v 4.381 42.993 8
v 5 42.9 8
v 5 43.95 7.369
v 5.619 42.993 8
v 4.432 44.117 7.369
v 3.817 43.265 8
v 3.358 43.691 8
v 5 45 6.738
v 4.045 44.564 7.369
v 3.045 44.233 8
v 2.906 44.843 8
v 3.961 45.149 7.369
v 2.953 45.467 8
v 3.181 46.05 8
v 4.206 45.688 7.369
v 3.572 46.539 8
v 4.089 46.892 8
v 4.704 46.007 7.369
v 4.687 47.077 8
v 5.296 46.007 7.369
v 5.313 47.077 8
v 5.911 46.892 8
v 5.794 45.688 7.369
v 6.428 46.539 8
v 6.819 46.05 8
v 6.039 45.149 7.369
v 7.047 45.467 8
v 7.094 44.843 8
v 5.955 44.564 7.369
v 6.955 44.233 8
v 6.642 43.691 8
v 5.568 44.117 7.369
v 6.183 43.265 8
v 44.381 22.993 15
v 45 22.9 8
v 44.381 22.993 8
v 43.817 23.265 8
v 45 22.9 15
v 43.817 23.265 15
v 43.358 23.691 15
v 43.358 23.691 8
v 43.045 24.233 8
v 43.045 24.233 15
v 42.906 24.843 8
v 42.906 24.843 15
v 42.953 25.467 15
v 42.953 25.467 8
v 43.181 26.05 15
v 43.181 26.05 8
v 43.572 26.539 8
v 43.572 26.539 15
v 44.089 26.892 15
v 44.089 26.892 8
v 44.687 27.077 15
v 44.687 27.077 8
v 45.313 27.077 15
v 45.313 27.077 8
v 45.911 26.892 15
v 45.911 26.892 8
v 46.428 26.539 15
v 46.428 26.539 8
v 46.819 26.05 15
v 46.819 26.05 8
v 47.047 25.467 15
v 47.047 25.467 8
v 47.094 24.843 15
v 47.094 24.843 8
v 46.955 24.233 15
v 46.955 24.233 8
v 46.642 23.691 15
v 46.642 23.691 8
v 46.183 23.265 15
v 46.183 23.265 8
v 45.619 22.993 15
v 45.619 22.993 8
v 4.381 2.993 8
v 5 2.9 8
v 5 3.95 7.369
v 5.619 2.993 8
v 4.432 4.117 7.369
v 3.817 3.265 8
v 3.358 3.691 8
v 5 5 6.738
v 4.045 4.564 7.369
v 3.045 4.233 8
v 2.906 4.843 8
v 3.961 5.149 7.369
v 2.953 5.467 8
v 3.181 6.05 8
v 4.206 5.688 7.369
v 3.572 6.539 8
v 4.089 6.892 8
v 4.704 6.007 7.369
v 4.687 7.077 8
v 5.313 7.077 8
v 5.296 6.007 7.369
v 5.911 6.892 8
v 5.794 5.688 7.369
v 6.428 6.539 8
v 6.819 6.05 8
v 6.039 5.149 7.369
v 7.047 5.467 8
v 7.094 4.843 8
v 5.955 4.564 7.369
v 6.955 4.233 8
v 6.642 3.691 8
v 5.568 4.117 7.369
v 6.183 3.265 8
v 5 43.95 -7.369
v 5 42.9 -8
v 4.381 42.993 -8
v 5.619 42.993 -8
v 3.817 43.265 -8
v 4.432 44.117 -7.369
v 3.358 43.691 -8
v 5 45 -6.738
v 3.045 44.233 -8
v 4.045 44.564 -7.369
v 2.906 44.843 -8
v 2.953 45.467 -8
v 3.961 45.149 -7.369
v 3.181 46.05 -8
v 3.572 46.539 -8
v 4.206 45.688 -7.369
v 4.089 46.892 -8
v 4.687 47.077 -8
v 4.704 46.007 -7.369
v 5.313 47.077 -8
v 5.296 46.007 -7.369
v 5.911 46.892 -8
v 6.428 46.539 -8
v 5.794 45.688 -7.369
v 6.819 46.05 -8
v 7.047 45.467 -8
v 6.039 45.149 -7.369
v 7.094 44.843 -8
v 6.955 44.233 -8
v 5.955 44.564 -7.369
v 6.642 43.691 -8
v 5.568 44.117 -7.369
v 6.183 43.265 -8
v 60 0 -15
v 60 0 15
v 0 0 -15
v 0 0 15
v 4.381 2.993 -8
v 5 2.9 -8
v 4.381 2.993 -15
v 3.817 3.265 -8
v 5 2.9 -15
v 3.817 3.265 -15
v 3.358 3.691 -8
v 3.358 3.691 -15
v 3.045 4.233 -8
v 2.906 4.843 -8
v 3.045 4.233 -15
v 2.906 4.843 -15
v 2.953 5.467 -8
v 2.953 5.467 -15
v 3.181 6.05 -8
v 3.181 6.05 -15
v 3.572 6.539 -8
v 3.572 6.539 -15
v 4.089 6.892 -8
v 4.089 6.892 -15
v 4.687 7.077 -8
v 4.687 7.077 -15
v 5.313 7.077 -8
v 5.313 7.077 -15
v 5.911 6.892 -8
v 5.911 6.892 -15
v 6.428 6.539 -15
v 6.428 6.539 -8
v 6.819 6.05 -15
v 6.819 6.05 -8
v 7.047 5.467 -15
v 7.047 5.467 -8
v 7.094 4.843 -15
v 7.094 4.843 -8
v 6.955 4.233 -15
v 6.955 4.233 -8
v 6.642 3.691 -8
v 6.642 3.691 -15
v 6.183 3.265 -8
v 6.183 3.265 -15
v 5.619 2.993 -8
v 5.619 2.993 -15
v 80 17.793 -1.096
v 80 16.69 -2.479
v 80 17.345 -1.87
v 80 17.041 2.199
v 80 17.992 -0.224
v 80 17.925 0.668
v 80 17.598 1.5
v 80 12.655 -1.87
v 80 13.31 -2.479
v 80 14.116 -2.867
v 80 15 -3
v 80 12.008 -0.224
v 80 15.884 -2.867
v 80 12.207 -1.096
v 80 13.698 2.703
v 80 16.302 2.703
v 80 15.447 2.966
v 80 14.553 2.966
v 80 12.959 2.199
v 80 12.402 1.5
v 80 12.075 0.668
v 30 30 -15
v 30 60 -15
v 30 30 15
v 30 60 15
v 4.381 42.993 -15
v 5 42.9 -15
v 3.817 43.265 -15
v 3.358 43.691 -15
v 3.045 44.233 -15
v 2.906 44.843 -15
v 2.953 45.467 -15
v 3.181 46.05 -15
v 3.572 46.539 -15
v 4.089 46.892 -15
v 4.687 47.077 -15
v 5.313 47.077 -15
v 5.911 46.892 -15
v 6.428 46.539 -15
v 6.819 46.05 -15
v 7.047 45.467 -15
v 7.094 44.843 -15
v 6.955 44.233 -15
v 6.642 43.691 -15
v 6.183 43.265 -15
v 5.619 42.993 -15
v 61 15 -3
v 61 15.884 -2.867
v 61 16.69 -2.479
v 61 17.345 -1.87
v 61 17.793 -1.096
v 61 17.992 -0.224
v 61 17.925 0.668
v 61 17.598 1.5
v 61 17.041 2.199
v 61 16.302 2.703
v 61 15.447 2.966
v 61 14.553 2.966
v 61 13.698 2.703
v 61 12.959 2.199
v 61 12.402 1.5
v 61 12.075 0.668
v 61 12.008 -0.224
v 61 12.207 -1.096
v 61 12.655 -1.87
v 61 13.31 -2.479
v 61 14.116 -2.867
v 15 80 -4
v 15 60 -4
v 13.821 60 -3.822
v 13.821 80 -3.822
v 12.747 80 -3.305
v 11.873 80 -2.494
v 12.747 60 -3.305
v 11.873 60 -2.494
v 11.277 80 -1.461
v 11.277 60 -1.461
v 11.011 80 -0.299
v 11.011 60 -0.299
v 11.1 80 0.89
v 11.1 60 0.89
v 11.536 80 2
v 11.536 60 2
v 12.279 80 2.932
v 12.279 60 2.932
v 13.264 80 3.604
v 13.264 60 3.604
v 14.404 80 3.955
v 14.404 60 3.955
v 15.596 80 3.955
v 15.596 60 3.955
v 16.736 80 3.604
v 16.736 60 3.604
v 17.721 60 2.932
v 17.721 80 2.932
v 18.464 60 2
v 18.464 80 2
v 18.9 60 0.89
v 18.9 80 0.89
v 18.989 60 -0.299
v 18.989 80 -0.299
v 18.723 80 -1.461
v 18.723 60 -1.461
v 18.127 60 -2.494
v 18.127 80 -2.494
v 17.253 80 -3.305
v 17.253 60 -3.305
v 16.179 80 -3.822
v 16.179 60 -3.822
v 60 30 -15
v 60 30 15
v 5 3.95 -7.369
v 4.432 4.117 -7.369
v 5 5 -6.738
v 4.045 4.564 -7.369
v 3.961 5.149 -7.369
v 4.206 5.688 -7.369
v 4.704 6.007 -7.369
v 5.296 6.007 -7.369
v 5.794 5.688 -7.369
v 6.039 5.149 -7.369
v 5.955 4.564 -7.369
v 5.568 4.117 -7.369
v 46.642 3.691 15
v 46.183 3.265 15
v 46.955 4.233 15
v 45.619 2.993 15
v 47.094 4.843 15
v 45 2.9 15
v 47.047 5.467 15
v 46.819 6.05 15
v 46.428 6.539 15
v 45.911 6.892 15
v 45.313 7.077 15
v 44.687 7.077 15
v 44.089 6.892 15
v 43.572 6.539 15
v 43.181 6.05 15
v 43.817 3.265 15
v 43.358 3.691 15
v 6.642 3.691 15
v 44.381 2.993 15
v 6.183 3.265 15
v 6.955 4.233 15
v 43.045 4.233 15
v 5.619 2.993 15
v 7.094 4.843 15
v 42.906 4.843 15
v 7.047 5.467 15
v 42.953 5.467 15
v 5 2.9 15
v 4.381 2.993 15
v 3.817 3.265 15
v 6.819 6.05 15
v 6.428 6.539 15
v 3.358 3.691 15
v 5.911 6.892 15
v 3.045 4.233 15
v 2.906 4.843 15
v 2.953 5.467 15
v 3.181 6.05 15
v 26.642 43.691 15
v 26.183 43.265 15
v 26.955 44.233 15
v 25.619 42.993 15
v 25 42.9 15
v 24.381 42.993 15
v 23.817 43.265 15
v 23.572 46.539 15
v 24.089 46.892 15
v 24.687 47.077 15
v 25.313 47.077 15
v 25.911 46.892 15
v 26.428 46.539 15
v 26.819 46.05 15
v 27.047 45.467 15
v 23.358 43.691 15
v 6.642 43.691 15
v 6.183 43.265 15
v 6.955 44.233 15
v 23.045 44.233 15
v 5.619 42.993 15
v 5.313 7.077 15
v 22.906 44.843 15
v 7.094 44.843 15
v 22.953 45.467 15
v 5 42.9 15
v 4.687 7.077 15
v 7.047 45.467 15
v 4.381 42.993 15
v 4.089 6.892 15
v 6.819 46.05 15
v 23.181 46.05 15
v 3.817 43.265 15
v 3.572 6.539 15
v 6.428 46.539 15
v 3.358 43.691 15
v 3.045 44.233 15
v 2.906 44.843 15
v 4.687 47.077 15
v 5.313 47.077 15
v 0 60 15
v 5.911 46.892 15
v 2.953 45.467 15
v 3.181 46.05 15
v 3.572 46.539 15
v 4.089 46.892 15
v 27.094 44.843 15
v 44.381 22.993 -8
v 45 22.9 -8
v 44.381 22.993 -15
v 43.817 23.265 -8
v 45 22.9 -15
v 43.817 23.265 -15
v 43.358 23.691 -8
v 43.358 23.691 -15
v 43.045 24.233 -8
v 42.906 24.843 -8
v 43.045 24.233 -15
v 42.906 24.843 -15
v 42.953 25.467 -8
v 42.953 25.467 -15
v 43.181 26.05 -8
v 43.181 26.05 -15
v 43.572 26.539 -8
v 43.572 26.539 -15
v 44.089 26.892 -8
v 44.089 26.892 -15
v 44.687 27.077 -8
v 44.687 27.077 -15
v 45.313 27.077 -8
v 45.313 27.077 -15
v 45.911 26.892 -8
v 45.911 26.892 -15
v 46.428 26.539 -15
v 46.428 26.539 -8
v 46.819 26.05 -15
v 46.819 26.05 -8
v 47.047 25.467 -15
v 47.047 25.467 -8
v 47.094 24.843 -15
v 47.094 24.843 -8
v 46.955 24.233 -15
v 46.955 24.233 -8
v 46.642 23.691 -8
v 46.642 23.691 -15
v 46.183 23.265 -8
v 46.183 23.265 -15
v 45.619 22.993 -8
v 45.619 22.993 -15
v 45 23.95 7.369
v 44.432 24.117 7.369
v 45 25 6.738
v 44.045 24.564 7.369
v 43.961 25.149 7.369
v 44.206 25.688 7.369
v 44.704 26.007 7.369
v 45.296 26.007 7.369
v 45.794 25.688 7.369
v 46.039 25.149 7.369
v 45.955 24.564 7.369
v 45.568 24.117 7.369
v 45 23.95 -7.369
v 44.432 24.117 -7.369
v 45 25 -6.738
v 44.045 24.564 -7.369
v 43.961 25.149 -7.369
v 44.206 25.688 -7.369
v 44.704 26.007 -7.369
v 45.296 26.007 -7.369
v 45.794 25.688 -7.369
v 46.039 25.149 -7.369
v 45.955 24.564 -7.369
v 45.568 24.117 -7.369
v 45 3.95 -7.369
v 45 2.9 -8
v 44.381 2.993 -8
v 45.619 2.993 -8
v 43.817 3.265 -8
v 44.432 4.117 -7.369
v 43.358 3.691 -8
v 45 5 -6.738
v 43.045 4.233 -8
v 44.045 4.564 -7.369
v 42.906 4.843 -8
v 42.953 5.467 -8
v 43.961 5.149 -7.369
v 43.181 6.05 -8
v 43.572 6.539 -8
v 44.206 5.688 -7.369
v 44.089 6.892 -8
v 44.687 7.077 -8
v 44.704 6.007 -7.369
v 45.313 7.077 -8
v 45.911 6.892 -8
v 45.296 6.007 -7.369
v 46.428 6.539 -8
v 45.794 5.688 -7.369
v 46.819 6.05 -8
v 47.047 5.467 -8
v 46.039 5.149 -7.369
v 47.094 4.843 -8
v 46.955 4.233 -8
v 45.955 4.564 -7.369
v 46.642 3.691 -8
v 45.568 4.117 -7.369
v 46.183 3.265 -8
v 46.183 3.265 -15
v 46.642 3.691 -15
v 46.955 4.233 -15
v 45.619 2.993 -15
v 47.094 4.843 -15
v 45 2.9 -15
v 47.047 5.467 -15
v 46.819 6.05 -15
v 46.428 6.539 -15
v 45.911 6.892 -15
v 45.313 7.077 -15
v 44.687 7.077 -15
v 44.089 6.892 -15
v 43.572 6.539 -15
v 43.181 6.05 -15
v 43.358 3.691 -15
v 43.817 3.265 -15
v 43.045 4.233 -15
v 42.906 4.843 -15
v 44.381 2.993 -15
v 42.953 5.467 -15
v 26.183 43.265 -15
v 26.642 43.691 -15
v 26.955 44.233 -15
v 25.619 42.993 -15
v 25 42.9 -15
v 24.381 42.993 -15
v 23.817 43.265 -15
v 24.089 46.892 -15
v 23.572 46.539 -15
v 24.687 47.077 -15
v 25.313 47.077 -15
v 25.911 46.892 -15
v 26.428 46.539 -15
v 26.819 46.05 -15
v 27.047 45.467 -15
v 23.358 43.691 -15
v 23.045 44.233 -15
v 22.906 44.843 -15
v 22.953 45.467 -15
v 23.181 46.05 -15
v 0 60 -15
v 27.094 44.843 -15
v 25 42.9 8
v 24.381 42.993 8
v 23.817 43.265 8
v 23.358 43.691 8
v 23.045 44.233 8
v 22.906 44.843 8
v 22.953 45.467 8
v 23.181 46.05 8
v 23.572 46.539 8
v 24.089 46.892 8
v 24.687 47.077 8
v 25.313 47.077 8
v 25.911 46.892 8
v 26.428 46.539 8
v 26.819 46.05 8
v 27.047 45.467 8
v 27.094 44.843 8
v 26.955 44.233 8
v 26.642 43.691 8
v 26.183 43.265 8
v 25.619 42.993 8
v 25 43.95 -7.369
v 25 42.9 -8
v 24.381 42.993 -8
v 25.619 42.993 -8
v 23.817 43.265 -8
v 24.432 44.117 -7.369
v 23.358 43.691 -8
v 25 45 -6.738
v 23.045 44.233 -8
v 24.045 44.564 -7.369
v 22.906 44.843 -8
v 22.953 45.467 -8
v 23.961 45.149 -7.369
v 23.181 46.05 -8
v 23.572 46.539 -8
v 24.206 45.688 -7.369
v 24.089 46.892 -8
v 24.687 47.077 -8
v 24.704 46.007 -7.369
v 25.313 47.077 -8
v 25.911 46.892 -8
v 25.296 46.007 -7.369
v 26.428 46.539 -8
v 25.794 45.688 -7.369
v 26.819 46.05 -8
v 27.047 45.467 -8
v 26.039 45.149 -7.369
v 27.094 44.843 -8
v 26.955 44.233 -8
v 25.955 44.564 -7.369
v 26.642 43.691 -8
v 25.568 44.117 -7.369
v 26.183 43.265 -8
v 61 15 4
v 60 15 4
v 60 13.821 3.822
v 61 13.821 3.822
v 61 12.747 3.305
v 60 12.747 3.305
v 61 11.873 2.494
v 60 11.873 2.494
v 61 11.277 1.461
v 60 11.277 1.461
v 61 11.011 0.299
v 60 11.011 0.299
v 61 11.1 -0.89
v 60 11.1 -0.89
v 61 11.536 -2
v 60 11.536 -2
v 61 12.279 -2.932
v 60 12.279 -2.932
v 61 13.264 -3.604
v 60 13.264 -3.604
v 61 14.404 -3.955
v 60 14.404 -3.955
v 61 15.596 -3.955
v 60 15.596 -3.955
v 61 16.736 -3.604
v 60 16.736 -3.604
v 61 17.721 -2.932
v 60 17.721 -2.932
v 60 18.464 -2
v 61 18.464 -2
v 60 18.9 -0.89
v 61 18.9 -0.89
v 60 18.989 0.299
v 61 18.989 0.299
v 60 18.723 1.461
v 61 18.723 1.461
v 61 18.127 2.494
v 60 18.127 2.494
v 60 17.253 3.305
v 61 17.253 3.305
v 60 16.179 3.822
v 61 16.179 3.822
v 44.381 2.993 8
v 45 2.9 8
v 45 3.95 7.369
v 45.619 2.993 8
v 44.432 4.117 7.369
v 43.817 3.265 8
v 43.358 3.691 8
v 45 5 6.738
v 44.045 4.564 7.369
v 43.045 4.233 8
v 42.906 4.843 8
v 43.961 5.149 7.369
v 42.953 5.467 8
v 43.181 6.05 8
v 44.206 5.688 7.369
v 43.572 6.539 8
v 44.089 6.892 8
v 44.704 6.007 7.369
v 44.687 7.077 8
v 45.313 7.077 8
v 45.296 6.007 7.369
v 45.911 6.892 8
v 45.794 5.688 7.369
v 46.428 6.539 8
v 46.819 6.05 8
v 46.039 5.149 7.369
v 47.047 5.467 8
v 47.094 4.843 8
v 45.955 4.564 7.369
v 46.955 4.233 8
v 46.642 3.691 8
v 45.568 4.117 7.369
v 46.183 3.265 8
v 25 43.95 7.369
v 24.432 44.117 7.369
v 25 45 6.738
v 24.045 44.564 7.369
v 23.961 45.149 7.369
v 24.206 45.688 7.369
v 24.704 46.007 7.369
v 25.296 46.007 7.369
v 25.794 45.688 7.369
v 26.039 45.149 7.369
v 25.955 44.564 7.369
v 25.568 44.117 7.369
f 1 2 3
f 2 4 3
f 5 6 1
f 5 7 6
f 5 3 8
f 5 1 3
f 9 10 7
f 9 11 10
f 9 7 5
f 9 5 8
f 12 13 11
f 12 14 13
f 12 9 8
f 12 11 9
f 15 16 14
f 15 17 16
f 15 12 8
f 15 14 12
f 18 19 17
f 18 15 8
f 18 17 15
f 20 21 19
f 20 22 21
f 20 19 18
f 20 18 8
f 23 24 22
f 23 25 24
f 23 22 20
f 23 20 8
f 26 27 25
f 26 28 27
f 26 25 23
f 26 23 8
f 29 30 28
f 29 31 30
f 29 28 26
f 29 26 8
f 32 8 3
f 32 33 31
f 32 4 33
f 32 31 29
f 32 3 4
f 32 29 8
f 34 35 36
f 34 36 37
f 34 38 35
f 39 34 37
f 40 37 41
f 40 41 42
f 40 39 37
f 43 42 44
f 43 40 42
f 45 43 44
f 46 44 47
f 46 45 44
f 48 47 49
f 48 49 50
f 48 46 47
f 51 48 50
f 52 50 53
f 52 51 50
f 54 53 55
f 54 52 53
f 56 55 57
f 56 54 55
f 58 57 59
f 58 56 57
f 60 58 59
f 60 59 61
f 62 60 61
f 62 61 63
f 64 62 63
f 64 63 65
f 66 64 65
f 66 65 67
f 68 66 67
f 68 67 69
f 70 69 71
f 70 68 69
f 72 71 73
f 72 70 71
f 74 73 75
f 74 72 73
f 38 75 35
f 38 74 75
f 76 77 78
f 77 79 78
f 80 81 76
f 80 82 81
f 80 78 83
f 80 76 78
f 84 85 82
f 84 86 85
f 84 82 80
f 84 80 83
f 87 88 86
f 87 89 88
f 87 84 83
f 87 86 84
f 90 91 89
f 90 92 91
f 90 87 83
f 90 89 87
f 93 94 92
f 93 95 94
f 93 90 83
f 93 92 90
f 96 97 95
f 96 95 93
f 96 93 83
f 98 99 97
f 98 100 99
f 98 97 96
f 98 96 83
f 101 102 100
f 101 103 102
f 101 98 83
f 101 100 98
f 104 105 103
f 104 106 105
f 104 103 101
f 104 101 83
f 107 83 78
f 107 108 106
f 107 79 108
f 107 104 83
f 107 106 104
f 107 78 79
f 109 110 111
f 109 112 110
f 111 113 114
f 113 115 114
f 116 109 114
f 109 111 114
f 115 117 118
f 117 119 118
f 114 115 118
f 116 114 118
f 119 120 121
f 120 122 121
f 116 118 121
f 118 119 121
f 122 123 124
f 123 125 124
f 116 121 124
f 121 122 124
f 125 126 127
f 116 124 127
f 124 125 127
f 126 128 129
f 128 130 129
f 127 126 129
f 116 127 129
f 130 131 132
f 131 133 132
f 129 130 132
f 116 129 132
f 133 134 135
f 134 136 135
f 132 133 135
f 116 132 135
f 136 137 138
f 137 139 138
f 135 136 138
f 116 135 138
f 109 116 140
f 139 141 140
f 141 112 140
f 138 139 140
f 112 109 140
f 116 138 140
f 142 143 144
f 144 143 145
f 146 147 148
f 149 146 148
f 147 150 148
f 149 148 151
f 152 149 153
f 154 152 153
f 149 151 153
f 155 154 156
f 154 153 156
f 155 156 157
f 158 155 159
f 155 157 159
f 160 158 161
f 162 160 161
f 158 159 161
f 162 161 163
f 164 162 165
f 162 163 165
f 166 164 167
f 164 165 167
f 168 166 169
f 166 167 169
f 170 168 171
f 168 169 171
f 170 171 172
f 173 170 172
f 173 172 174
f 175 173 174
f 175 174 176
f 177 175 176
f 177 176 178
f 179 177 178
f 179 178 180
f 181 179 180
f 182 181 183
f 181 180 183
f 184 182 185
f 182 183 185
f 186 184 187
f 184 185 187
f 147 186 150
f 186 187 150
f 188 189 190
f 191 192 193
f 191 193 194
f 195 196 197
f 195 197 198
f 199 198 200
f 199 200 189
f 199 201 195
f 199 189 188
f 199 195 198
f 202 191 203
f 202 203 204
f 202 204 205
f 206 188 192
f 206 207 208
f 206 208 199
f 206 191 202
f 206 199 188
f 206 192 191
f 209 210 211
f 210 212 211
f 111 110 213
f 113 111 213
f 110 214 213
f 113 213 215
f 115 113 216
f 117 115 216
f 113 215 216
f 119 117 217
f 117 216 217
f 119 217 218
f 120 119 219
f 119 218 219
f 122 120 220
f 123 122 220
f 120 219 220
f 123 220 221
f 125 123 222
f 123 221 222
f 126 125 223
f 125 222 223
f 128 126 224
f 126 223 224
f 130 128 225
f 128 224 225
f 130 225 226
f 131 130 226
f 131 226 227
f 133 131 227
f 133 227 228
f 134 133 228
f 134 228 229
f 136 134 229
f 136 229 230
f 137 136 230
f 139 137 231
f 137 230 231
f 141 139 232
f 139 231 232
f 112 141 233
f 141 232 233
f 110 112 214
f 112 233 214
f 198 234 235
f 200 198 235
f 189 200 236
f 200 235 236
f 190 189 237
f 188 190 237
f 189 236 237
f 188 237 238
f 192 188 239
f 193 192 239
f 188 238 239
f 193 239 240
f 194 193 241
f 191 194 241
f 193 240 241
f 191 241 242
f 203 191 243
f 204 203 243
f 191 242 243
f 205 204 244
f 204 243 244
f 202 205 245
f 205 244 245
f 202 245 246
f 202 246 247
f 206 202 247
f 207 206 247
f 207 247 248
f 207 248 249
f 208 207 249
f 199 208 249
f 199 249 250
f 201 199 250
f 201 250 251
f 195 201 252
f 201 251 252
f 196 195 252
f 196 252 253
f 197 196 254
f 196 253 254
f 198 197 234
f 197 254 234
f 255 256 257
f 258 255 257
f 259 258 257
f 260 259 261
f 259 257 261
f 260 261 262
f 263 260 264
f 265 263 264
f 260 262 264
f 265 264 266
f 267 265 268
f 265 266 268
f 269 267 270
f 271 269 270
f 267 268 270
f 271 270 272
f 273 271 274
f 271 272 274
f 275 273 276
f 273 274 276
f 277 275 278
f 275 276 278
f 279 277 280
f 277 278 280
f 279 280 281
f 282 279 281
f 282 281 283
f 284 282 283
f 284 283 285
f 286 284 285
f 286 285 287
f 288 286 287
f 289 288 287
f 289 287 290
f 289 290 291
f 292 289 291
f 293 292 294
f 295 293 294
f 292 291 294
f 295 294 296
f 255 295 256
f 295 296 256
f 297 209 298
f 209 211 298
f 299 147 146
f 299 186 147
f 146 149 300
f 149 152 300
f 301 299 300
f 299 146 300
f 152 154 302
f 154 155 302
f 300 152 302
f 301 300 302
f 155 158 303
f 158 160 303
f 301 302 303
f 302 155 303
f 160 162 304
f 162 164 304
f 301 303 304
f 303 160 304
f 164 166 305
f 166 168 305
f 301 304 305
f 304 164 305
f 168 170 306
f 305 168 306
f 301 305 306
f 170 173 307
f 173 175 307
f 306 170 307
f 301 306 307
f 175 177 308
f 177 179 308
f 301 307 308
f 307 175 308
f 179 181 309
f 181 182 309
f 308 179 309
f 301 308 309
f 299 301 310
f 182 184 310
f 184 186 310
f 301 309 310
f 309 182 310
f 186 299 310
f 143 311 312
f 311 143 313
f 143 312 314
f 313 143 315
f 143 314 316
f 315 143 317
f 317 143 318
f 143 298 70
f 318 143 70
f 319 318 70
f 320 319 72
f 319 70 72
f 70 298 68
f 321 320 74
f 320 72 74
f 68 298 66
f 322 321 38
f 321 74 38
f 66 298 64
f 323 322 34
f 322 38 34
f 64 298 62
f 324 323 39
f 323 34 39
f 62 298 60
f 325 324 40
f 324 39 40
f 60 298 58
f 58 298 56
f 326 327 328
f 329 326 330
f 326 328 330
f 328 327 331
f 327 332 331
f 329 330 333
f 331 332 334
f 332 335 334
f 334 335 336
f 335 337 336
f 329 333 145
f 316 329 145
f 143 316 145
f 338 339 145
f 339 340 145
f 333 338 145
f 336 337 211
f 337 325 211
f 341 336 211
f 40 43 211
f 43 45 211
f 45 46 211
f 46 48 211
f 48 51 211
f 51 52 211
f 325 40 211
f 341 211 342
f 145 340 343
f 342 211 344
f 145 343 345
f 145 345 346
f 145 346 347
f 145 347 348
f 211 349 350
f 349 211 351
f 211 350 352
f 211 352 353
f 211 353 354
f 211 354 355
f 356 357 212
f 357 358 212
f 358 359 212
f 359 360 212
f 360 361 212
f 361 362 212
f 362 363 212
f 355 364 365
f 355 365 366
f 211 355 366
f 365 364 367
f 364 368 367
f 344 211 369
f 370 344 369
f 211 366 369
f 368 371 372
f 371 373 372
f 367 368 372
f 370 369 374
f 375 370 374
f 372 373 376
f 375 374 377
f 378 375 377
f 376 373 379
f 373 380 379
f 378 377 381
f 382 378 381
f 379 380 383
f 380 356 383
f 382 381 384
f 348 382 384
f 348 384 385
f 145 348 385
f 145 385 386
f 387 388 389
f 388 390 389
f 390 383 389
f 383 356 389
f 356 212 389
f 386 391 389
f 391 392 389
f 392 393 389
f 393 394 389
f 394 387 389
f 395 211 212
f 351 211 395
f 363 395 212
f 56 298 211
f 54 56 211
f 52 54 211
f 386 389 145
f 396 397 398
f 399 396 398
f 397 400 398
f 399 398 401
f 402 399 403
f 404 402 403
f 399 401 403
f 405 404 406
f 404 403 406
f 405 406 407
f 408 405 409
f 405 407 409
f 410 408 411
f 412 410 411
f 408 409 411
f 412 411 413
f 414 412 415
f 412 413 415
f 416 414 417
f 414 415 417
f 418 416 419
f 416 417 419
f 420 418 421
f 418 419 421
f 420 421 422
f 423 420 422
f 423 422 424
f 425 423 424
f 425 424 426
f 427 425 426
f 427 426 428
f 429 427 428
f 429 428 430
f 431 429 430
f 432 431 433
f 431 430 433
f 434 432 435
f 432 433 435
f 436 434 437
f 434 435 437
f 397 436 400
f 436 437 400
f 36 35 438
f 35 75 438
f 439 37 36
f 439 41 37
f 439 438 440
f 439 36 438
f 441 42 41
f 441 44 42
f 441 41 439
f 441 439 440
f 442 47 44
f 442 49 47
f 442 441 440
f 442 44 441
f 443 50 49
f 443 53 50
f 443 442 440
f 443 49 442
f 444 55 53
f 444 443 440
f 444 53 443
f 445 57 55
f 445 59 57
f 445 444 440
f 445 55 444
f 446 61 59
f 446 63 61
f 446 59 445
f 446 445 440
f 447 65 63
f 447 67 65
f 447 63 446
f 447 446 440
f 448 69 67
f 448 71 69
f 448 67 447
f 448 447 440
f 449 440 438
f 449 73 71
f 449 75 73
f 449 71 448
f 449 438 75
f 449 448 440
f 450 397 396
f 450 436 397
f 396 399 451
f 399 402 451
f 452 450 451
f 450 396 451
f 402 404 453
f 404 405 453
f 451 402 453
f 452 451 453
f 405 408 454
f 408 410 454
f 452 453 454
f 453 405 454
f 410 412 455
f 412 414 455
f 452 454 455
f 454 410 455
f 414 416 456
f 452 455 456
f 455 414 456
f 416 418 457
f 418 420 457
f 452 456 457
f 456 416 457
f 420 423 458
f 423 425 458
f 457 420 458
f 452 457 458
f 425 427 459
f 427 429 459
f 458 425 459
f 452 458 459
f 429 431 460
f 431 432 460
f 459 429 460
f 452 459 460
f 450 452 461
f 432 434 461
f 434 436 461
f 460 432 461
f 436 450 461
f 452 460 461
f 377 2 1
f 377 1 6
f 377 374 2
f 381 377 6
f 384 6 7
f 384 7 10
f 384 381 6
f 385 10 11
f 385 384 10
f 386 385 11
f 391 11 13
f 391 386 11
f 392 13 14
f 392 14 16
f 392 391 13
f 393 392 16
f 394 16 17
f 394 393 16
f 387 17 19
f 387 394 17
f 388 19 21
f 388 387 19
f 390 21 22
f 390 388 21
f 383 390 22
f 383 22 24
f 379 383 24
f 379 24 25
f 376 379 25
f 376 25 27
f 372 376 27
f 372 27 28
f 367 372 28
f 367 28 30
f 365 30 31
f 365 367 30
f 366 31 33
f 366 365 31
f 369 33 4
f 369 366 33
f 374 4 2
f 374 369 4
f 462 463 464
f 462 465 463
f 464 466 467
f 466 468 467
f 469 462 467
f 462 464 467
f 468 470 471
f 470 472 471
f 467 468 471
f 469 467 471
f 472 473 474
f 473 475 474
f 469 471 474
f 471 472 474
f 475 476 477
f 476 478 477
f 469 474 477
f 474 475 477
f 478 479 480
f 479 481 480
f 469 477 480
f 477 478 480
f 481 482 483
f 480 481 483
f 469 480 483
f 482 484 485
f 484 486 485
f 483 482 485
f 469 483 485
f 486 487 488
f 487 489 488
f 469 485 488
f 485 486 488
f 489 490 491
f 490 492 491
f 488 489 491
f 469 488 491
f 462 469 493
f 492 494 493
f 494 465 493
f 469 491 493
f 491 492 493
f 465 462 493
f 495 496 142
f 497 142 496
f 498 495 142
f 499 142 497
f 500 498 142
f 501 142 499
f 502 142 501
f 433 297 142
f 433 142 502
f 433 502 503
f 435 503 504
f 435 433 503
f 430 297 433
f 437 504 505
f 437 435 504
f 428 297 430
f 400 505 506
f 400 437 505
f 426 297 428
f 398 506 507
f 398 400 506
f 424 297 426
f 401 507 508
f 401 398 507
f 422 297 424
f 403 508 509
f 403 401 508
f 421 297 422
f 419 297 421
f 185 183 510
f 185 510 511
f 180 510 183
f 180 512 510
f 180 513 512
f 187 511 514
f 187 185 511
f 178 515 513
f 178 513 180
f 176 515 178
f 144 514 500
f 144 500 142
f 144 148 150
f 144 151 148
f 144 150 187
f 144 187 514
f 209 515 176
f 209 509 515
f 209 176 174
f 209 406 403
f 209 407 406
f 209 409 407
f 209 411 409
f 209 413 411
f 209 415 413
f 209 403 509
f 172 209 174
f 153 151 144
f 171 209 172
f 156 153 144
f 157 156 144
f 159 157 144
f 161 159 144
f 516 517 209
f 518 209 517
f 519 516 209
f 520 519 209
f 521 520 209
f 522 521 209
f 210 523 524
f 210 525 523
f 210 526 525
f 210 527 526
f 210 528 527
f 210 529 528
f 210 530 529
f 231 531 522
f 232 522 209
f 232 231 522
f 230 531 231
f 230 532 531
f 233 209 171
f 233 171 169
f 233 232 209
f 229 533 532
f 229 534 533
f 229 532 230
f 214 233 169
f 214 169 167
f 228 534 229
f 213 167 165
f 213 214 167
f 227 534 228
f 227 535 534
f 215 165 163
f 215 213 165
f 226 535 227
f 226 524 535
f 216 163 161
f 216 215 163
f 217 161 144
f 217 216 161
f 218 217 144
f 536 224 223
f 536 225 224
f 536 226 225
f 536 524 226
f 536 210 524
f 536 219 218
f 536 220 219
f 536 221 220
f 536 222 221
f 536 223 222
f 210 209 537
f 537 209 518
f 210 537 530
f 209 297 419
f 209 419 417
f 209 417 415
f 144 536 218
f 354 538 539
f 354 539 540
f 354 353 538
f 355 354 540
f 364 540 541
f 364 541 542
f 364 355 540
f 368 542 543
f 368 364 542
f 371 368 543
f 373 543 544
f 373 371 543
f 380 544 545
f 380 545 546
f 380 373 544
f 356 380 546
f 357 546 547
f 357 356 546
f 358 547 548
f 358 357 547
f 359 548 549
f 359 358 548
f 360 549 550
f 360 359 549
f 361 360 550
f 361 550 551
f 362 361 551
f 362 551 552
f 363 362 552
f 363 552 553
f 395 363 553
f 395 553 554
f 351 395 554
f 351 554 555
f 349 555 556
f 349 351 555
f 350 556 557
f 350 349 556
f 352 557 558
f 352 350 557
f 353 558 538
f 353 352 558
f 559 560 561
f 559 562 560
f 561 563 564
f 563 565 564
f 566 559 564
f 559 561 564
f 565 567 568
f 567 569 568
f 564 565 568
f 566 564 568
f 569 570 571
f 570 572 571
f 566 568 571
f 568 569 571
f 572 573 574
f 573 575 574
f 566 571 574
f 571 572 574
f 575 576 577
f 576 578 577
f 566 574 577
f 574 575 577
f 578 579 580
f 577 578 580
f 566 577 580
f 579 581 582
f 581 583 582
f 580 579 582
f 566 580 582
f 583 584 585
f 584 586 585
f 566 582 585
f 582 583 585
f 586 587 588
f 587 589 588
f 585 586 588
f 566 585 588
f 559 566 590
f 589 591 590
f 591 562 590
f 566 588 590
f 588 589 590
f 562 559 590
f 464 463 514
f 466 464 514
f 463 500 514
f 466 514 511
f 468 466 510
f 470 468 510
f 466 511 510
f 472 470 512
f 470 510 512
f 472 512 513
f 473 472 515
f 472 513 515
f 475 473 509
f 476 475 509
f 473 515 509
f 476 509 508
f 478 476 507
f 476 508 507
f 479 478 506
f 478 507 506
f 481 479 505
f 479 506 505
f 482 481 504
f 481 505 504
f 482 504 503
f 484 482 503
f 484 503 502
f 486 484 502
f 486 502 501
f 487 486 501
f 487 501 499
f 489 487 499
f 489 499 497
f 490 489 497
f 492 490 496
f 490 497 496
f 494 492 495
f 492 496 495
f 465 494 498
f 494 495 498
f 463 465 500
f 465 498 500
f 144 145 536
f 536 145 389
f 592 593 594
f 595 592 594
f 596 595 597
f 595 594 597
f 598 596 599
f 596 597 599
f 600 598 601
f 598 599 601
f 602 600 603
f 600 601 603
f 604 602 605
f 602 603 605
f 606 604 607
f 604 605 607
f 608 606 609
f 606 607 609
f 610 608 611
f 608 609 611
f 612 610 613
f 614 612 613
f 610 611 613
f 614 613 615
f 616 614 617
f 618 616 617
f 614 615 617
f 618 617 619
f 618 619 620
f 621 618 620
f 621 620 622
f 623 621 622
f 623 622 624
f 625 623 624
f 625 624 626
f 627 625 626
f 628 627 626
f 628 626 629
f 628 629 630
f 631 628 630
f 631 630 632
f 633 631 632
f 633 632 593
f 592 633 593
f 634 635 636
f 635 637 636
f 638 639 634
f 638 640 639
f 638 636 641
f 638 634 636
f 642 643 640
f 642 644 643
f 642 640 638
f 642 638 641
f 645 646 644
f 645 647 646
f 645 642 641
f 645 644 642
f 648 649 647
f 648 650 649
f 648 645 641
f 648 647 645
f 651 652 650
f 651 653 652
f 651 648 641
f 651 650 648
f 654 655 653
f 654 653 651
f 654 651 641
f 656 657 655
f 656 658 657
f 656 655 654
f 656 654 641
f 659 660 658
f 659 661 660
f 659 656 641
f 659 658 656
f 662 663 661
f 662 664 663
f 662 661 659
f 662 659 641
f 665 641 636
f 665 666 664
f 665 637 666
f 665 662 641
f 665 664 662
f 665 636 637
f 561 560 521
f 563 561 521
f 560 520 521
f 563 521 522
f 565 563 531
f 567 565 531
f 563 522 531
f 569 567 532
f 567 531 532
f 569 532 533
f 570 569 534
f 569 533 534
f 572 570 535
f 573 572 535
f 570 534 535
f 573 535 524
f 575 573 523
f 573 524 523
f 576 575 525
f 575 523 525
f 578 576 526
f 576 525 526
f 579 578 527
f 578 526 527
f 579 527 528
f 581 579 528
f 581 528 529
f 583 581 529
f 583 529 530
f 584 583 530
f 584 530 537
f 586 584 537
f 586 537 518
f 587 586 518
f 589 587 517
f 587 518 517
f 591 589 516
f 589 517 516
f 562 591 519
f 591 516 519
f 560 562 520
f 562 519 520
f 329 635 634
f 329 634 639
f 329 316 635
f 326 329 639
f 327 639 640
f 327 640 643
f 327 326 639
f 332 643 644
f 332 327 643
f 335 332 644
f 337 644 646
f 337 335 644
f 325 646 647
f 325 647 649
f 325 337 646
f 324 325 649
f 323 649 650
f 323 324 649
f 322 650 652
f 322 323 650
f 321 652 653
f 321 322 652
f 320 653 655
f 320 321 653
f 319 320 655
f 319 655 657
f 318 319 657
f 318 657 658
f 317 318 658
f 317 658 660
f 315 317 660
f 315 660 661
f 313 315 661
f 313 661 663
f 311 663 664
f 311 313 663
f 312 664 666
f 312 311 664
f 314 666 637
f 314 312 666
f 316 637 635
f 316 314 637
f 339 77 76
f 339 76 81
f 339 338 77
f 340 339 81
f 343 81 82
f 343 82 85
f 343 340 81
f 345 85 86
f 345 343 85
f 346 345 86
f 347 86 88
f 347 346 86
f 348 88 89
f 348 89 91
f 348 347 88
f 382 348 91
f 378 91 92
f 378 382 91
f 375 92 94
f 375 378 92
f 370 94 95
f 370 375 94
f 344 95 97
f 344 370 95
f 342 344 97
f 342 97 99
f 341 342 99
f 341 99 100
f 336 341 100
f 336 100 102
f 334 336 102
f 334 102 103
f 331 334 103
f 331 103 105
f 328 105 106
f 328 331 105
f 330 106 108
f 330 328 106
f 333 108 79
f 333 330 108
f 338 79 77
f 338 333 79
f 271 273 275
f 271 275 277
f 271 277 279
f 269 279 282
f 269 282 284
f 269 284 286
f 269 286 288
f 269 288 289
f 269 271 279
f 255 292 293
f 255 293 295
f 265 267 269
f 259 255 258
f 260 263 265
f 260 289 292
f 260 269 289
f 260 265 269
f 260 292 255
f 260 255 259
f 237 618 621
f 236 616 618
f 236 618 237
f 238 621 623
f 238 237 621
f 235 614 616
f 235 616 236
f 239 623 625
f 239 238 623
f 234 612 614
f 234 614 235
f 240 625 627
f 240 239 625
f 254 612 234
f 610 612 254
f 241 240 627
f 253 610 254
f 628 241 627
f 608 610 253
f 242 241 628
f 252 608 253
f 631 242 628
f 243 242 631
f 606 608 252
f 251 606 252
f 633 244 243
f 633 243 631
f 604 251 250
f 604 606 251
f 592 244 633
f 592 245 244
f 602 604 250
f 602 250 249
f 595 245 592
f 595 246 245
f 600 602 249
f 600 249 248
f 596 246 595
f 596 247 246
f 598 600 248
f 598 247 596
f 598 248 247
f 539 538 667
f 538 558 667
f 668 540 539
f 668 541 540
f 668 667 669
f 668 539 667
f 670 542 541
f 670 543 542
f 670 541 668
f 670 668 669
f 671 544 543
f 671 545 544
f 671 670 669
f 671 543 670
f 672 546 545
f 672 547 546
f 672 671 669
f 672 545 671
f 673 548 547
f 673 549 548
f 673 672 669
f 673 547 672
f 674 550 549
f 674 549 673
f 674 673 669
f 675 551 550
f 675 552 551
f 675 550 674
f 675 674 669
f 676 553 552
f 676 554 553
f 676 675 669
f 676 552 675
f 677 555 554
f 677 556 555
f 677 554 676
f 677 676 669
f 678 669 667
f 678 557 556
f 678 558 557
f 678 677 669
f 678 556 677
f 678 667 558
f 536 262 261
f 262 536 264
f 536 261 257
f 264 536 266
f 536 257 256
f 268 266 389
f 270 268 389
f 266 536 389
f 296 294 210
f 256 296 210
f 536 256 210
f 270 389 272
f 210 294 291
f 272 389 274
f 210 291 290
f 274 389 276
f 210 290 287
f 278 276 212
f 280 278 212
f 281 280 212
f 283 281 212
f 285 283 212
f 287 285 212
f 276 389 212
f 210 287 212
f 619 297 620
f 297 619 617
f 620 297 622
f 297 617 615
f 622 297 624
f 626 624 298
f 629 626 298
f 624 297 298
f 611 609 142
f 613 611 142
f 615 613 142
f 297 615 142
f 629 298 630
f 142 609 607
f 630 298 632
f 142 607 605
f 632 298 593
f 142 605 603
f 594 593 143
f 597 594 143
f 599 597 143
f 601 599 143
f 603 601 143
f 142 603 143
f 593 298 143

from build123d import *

# Parameters (mm, degrees)
BOSS_EXTRU_1_DEPTH             = 15
ESQUISSE3_R                    = 4
BOSS_EXTRU_2_DEPTH             = 20
ESQUISSE4_R                    = 4
BOSS_EXTRU_3_DEPTH             = 20
TROU_TARAUD_M5X0_85_AT_2_COUNT = 2
TROU_TARAUD_M5X0_85_AT_2_PITCH = 44.72135955
ENL_V_START                    = -19
ESQUISSE13_R                   = 4
ESQUISSE13_R_2                 = 3
ENL_V_MAT_EXTRU_1_DEPTH        = 19


with BuildPart() as part:
    # Esquisse1 → Boss.-Extru.1 (new, symmetric)
    with BuildSketch(Plane.XY):
        Polygon((0, 60), (30, 60), (30, 30), (60, 30), (60, 0), (0, 0), align=None)
    extrude(amount=BOSS_EXTRU_1_DEPTH, both=True)

    # Esquisse3 → Boss.-Extru.2 (add)
    with BuildSketch(Plane(origin=(0, 60, 0), x_dir=(-1, 0, 0), z_dir=(0, 1, 0))):
        with Locations(Location((-15, 0, 0), (0, 0, 270))):
            Circle(ESQUISSE3_R)
    extrude(amount=BOSS_EXTRU_2_DEPTH)

    # Esquisse4 → Boss.-Extru.3 (add)
    with BuildSketch(Plane(origin=(60, 0, 0), x_dir=(0, 0, -1), z_dir=(1, 0, 0))):
        with Locations(Location((0, 15, 0), (0, 0, 180))):
            Circle(ESQUISSE4_R)
    extrude(amount=BOSS_EXTRU_3_DEPTH)

    # Esquisse8 → Trou taraudé M5x0.82 (revolve, cut)
    with BuildSketch(Plane(origin=(45, 5, 15), x_dir=(0, -1, 0), z_dir=(1, 0, 0))):
        Polygon((0, 0), (0, 8.2618073), (2.1, 7), (2.1, 0), align=None)
    trou_taraud_m5x0_82 = revolve(axis=Axis((45, 5, 21.35), (0, 0, -1)), mode=Mode.SUBTRACT)

    # Esquisse9 → Trou taraudé M5x0.83 (revolve, cut)
    with BuildSketch(Plane(origin=(45, 25, 15), x_dir=(0, -1, 0), z_dir=(1, 0, 0))):
        Polygon((0, 0), (0, 8.2618073), (2.1, 7), (2.1, 0), align=None)
    trou_taraud_m5x0_83 = revolve(axis=Axis((45, 25, 21.35), (0, 0, -1)), mode=Mode.SUBTRACT)

    # Esquisse10 → Trou taraudé M5x0.84 (revolve, cut)
    with BuildSketch(Plane(origin=(5, 45, 15), x_dir=(0, -1, 0), z_dir=(1, 0, 0))):
        Polygon((0, 0), (0, 8.2618073), (2.1, 7), (2.1, 0), align=None)
    trou_taraud_m5x0_84 = revolve(axis=Axis((5, 45, 21.35), (0, 0, -1)), mode=Mode.SUBTRACT)

    # Esquisse12 → Trou taraudé M5x0.85 (revolve, cut)
    with BuildSketch(Plane(origin=(25, 45, 15), x_dir=(0, -1, 0), z_dir=(1, 0, 0))):
        Polygon((0, 0), (0, 8.2618073), (2.1, 7), (2.1, 0), align=None)
    trou_taraud_m5x0_85 = revolve(axis=Axis((25, 45, 21.35), (0, 0, -1)), mode=Mode.SUBTRACT)

    # Trou taraudé M5x0.85 at 2: Trou taraudé M5x0.85 ×2
    with Locations(*[Vector(-0.447213595499958, -0.8944271909999159, 0) * (i * TROU_TARAUD_M5X0_85_AT_2_PITCH) for i in range(1, TROU_TARAUD_M5X0_85_AT_2_COUNT)]):
        add(trou_taraud_m5x0_85, mode=Mode.SUBTRACT)

    # Symétrie1: Trou taraudé M5x0.82, Trou taraudé M5x0.83, Trou taraudé M5x0.84, Trou taraudé M5x0.85 across plane
    add(trou_taraud_m5x0_82.mirror(Plane.XY), mode=Mode.SUBTRACT)
    add(trou_taraud_m5x0_83.mirror(Plane.XY), mode=Mode.SUBTRACT)
    add(trou_taraud_m5x0_84.mirror(Plane.XY), mode=Mode.SUBTRACT)
    add(trou_taraud_m5x0_85.mirror(Plane.XY), mode=Mode.SUBTRACT)

    # Symétrie1 copy 1 sketch → Symétrie1 copy 1 (revolve, cut)
    with BuildSketch(Plane(origin=(5, 5, -15), x_dir=(0, -1, 0), z_dir=(1, 0, 0))):
        Polygon((0, 0), (0, -8.2618073), (2.1, -7), (2.1, 0), align=None)
    revolve(axis=Axis((5, 5, -21.35), (0, 0, -1)), mode=Mode.SUBTRACT)

    # Esquisse13 → Enlèv. mat.-Extru.1 (cut)
    with BuildSketch(Plane(origin=(80, 0, 0), x_dir=(0, 0, -1), z_dir=(1, 0, 0)).offset(ENL_V_START)):
        with Locations(Location((0, 15, 0), (0, 0, 180))):
            Circle(ESQUISSE13_R)
        with Locations((0, 15)):
            Circle(ESQUISSE13_R_2, mode=Mode.SUBTRACT)
    extrude(amount=ENL_V_MAT_EXTRU_1_DEPTH, mode=Mode.SUBTRACT)


solid = part.part
